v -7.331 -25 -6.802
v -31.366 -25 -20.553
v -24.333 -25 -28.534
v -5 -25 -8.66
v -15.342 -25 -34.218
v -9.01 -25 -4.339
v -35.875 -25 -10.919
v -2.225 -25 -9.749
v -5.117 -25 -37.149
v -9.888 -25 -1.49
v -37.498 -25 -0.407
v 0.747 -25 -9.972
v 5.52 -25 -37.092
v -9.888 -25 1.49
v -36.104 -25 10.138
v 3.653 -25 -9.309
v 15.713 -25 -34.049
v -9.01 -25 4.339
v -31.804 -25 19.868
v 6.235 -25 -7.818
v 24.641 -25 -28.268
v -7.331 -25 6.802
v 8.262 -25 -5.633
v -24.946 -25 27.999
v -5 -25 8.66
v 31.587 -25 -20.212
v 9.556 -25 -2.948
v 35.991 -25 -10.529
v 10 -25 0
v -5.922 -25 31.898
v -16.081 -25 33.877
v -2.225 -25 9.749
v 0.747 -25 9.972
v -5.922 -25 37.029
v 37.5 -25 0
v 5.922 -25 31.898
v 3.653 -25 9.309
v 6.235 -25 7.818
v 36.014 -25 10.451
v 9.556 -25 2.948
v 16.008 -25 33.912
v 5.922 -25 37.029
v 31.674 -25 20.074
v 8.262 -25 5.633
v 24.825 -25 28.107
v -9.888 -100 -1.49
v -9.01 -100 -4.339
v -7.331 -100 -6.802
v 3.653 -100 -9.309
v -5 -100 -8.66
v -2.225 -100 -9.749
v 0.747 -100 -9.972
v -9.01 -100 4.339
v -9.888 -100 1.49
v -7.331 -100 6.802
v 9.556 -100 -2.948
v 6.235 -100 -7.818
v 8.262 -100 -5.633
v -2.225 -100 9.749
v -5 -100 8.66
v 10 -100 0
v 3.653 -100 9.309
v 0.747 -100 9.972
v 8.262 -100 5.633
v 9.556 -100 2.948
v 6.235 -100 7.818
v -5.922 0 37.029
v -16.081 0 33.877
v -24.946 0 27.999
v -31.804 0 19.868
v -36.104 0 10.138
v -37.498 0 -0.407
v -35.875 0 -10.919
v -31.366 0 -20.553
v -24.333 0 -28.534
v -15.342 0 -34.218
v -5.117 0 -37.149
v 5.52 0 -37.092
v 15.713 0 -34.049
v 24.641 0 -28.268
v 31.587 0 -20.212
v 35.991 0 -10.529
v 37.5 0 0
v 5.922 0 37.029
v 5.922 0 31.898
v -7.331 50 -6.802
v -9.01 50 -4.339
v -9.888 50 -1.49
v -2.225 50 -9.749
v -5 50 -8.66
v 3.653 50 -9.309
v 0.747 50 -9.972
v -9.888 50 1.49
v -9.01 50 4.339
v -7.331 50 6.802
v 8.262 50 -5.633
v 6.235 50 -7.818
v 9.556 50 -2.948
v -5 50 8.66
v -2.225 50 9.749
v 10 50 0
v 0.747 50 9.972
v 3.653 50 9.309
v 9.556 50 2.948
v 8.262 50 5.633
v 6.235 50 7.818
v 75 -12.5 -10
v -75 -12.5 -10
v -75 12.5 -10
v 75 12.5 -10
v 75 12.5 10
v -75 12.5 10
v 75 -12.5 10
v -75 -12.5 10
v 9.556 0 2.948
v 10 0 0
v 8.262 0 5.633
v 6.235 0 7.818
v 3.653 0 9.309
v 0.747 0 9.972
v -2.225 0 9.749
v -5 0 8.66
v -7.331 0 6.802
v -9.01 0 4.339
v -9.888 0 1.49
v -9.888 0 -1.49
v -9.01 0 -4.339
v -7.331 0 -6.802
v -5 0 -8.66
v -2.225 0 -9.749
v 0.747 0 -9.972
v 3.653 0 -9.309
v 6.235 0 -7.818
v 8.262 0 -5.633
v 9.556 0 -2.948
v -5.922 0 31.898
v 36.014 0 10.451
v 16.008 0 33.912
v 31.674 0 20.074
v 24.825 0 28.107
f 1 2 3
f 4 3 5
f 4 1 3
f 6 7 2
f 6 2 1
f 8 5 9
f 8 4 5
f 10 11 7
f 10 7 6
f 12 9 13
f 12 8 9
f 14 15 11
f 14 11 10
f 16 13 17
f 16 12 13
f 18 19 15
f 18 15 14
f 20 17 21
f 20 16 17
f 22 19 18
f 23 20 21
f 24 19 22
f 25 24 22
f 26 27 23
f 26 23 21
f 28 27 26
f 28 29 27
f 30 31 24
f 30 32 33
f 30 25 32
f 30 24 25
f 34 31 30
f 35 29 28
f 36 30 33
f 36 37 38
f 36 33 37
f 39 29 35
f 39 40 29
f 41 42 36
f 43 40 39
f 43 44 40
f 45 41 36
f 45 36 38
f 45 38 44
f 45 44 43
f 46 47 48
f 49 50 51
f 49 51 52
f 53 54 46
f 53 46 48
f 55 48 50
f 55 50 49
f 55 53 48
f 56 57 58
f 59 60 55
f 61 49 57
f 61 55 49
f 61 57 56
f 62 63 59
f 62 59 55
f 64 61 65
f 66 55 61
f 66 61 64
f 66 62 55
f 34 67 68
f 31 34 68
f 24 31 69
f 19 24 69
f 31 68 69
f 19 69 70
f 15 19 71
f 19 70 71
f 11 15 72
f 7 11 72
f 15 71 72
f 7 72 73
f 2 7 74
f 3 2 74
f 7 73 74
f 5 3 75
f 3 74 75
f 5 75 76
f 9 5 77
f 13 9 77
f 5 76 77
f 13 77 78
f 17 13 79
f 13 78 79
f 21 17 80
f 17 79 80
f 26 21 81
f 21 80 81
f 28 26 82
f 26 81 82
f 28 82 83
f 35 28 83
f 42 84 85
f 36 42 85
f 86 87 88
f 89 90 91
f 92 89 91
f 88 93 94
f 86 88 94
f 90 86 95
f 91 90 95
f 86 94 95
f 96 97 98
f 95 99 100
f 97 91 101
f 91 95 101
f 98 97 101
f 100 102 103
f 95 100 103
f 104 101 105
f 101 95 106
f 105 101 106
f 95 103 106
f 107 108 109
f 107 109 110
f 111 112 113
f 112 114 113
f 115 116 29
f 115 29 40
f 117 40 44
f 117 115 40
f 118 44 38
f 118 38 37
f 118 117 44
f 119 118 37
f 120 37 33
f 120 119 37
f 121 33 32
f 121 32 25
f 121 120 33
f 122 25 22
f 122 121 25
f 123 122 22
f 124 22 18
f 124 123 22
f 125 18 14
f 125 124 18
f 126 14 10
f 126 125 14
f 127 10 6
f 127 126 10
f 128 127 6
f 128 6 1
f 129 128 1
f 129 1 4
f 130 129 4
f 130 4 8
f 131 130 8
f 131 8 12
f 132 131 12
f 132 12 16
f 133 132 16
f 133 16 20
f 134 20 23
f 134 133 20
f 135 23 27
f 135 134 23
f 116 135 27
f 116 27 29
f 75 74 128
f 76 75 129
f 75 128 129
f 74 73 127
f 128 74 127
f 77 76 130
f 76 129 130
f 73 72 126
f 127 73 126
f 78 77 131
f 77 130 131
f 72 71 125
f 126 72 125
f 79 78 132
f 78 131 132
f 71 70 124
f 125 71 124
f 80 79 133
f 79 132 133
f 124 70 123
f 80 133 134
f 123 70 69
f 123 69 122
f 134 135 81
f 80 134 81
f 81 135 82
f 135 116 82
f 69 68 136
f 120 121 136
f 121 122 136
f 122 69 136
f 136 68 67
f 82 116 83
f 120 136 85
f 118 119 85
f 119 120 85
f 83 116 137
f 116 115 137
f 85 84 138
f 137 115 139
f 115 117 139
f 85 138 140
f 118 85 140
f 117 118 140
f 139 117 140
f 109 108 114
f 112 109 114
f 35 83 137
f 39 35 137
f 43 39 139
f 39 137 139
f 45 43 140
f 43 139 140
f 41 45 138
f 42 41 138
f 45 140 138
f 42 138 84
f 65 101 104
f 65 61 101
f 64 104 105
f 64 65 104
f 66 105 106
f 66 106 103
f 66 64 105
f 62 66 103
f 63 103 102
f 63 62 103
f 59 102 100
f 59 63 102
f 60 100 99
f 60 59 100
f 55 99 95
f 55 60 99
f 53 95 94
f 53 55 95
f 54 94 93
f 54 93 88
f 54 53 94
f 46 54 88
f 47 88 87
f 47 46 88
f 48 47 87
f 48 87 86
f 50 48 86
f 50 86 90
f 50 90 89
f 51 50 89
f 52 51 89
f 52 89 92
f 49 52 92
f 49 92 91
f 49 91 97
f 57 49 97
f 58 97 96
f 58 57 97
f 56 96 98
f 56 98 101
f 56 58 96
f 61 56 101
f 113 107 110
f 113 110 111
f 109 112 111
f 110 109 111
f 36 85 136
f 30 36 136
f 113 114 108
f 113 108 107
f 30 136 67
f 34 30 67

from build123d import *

# Parameters (mm, degrees)
F0_R          = 10
F1_DEPTH      = 25
F2_DEPTH      = 100
F2_DEPTH_BACK = 50
F3_W          = 150
F3_H          = 20
F4_DEPTH      = 12.5


with BuildPart() as f1:
    # F0 (on Front) → F1 (new body)
    with BuildSketch(Plane.XZ):
        with BuildLine():
            ThreePointArc((-5.922125, 37.029427), (-24.3328, -28.533574), (37.5, 0))
            ThreePointArc((37.5, 0), (28.533574, 24.3328), (5.922125, 37.029427))
            Line((5.922125, 37.029427), (5.922125, 31.897775))
            Line((5.922125, 31.897775), (-5.922125, 31.897775))
            Line((-5.922125, 31.897775), (-5.922125, 37.029427))
        make_face()
        Circle(F0_R, mode=Mode.SUBTRACT)
    extrude(amount=F1_DEPTH)


with BuildPart() as f2:
    # F0 (on Front) → F2 (new body, two sides)
    with BuildSketch(Plane.XZ) as f2_sk:
        Circle(F0_R)
    extrude(amount=F2_DEPTH)
    extrude(f2_sk.sketch, amount=-F2_DEPTH_BACK)


with BuildPart() as f4:
    # F3 (on Front) → F4 (new body, symmetric)
    with BuildSketch(Plane.XZ):
        Rectangle(F3_W, F3_H)
    extrude(amount=F4_DEPTH, both=True)


solid = Compound([f1.part, f2.part, f4.part])
